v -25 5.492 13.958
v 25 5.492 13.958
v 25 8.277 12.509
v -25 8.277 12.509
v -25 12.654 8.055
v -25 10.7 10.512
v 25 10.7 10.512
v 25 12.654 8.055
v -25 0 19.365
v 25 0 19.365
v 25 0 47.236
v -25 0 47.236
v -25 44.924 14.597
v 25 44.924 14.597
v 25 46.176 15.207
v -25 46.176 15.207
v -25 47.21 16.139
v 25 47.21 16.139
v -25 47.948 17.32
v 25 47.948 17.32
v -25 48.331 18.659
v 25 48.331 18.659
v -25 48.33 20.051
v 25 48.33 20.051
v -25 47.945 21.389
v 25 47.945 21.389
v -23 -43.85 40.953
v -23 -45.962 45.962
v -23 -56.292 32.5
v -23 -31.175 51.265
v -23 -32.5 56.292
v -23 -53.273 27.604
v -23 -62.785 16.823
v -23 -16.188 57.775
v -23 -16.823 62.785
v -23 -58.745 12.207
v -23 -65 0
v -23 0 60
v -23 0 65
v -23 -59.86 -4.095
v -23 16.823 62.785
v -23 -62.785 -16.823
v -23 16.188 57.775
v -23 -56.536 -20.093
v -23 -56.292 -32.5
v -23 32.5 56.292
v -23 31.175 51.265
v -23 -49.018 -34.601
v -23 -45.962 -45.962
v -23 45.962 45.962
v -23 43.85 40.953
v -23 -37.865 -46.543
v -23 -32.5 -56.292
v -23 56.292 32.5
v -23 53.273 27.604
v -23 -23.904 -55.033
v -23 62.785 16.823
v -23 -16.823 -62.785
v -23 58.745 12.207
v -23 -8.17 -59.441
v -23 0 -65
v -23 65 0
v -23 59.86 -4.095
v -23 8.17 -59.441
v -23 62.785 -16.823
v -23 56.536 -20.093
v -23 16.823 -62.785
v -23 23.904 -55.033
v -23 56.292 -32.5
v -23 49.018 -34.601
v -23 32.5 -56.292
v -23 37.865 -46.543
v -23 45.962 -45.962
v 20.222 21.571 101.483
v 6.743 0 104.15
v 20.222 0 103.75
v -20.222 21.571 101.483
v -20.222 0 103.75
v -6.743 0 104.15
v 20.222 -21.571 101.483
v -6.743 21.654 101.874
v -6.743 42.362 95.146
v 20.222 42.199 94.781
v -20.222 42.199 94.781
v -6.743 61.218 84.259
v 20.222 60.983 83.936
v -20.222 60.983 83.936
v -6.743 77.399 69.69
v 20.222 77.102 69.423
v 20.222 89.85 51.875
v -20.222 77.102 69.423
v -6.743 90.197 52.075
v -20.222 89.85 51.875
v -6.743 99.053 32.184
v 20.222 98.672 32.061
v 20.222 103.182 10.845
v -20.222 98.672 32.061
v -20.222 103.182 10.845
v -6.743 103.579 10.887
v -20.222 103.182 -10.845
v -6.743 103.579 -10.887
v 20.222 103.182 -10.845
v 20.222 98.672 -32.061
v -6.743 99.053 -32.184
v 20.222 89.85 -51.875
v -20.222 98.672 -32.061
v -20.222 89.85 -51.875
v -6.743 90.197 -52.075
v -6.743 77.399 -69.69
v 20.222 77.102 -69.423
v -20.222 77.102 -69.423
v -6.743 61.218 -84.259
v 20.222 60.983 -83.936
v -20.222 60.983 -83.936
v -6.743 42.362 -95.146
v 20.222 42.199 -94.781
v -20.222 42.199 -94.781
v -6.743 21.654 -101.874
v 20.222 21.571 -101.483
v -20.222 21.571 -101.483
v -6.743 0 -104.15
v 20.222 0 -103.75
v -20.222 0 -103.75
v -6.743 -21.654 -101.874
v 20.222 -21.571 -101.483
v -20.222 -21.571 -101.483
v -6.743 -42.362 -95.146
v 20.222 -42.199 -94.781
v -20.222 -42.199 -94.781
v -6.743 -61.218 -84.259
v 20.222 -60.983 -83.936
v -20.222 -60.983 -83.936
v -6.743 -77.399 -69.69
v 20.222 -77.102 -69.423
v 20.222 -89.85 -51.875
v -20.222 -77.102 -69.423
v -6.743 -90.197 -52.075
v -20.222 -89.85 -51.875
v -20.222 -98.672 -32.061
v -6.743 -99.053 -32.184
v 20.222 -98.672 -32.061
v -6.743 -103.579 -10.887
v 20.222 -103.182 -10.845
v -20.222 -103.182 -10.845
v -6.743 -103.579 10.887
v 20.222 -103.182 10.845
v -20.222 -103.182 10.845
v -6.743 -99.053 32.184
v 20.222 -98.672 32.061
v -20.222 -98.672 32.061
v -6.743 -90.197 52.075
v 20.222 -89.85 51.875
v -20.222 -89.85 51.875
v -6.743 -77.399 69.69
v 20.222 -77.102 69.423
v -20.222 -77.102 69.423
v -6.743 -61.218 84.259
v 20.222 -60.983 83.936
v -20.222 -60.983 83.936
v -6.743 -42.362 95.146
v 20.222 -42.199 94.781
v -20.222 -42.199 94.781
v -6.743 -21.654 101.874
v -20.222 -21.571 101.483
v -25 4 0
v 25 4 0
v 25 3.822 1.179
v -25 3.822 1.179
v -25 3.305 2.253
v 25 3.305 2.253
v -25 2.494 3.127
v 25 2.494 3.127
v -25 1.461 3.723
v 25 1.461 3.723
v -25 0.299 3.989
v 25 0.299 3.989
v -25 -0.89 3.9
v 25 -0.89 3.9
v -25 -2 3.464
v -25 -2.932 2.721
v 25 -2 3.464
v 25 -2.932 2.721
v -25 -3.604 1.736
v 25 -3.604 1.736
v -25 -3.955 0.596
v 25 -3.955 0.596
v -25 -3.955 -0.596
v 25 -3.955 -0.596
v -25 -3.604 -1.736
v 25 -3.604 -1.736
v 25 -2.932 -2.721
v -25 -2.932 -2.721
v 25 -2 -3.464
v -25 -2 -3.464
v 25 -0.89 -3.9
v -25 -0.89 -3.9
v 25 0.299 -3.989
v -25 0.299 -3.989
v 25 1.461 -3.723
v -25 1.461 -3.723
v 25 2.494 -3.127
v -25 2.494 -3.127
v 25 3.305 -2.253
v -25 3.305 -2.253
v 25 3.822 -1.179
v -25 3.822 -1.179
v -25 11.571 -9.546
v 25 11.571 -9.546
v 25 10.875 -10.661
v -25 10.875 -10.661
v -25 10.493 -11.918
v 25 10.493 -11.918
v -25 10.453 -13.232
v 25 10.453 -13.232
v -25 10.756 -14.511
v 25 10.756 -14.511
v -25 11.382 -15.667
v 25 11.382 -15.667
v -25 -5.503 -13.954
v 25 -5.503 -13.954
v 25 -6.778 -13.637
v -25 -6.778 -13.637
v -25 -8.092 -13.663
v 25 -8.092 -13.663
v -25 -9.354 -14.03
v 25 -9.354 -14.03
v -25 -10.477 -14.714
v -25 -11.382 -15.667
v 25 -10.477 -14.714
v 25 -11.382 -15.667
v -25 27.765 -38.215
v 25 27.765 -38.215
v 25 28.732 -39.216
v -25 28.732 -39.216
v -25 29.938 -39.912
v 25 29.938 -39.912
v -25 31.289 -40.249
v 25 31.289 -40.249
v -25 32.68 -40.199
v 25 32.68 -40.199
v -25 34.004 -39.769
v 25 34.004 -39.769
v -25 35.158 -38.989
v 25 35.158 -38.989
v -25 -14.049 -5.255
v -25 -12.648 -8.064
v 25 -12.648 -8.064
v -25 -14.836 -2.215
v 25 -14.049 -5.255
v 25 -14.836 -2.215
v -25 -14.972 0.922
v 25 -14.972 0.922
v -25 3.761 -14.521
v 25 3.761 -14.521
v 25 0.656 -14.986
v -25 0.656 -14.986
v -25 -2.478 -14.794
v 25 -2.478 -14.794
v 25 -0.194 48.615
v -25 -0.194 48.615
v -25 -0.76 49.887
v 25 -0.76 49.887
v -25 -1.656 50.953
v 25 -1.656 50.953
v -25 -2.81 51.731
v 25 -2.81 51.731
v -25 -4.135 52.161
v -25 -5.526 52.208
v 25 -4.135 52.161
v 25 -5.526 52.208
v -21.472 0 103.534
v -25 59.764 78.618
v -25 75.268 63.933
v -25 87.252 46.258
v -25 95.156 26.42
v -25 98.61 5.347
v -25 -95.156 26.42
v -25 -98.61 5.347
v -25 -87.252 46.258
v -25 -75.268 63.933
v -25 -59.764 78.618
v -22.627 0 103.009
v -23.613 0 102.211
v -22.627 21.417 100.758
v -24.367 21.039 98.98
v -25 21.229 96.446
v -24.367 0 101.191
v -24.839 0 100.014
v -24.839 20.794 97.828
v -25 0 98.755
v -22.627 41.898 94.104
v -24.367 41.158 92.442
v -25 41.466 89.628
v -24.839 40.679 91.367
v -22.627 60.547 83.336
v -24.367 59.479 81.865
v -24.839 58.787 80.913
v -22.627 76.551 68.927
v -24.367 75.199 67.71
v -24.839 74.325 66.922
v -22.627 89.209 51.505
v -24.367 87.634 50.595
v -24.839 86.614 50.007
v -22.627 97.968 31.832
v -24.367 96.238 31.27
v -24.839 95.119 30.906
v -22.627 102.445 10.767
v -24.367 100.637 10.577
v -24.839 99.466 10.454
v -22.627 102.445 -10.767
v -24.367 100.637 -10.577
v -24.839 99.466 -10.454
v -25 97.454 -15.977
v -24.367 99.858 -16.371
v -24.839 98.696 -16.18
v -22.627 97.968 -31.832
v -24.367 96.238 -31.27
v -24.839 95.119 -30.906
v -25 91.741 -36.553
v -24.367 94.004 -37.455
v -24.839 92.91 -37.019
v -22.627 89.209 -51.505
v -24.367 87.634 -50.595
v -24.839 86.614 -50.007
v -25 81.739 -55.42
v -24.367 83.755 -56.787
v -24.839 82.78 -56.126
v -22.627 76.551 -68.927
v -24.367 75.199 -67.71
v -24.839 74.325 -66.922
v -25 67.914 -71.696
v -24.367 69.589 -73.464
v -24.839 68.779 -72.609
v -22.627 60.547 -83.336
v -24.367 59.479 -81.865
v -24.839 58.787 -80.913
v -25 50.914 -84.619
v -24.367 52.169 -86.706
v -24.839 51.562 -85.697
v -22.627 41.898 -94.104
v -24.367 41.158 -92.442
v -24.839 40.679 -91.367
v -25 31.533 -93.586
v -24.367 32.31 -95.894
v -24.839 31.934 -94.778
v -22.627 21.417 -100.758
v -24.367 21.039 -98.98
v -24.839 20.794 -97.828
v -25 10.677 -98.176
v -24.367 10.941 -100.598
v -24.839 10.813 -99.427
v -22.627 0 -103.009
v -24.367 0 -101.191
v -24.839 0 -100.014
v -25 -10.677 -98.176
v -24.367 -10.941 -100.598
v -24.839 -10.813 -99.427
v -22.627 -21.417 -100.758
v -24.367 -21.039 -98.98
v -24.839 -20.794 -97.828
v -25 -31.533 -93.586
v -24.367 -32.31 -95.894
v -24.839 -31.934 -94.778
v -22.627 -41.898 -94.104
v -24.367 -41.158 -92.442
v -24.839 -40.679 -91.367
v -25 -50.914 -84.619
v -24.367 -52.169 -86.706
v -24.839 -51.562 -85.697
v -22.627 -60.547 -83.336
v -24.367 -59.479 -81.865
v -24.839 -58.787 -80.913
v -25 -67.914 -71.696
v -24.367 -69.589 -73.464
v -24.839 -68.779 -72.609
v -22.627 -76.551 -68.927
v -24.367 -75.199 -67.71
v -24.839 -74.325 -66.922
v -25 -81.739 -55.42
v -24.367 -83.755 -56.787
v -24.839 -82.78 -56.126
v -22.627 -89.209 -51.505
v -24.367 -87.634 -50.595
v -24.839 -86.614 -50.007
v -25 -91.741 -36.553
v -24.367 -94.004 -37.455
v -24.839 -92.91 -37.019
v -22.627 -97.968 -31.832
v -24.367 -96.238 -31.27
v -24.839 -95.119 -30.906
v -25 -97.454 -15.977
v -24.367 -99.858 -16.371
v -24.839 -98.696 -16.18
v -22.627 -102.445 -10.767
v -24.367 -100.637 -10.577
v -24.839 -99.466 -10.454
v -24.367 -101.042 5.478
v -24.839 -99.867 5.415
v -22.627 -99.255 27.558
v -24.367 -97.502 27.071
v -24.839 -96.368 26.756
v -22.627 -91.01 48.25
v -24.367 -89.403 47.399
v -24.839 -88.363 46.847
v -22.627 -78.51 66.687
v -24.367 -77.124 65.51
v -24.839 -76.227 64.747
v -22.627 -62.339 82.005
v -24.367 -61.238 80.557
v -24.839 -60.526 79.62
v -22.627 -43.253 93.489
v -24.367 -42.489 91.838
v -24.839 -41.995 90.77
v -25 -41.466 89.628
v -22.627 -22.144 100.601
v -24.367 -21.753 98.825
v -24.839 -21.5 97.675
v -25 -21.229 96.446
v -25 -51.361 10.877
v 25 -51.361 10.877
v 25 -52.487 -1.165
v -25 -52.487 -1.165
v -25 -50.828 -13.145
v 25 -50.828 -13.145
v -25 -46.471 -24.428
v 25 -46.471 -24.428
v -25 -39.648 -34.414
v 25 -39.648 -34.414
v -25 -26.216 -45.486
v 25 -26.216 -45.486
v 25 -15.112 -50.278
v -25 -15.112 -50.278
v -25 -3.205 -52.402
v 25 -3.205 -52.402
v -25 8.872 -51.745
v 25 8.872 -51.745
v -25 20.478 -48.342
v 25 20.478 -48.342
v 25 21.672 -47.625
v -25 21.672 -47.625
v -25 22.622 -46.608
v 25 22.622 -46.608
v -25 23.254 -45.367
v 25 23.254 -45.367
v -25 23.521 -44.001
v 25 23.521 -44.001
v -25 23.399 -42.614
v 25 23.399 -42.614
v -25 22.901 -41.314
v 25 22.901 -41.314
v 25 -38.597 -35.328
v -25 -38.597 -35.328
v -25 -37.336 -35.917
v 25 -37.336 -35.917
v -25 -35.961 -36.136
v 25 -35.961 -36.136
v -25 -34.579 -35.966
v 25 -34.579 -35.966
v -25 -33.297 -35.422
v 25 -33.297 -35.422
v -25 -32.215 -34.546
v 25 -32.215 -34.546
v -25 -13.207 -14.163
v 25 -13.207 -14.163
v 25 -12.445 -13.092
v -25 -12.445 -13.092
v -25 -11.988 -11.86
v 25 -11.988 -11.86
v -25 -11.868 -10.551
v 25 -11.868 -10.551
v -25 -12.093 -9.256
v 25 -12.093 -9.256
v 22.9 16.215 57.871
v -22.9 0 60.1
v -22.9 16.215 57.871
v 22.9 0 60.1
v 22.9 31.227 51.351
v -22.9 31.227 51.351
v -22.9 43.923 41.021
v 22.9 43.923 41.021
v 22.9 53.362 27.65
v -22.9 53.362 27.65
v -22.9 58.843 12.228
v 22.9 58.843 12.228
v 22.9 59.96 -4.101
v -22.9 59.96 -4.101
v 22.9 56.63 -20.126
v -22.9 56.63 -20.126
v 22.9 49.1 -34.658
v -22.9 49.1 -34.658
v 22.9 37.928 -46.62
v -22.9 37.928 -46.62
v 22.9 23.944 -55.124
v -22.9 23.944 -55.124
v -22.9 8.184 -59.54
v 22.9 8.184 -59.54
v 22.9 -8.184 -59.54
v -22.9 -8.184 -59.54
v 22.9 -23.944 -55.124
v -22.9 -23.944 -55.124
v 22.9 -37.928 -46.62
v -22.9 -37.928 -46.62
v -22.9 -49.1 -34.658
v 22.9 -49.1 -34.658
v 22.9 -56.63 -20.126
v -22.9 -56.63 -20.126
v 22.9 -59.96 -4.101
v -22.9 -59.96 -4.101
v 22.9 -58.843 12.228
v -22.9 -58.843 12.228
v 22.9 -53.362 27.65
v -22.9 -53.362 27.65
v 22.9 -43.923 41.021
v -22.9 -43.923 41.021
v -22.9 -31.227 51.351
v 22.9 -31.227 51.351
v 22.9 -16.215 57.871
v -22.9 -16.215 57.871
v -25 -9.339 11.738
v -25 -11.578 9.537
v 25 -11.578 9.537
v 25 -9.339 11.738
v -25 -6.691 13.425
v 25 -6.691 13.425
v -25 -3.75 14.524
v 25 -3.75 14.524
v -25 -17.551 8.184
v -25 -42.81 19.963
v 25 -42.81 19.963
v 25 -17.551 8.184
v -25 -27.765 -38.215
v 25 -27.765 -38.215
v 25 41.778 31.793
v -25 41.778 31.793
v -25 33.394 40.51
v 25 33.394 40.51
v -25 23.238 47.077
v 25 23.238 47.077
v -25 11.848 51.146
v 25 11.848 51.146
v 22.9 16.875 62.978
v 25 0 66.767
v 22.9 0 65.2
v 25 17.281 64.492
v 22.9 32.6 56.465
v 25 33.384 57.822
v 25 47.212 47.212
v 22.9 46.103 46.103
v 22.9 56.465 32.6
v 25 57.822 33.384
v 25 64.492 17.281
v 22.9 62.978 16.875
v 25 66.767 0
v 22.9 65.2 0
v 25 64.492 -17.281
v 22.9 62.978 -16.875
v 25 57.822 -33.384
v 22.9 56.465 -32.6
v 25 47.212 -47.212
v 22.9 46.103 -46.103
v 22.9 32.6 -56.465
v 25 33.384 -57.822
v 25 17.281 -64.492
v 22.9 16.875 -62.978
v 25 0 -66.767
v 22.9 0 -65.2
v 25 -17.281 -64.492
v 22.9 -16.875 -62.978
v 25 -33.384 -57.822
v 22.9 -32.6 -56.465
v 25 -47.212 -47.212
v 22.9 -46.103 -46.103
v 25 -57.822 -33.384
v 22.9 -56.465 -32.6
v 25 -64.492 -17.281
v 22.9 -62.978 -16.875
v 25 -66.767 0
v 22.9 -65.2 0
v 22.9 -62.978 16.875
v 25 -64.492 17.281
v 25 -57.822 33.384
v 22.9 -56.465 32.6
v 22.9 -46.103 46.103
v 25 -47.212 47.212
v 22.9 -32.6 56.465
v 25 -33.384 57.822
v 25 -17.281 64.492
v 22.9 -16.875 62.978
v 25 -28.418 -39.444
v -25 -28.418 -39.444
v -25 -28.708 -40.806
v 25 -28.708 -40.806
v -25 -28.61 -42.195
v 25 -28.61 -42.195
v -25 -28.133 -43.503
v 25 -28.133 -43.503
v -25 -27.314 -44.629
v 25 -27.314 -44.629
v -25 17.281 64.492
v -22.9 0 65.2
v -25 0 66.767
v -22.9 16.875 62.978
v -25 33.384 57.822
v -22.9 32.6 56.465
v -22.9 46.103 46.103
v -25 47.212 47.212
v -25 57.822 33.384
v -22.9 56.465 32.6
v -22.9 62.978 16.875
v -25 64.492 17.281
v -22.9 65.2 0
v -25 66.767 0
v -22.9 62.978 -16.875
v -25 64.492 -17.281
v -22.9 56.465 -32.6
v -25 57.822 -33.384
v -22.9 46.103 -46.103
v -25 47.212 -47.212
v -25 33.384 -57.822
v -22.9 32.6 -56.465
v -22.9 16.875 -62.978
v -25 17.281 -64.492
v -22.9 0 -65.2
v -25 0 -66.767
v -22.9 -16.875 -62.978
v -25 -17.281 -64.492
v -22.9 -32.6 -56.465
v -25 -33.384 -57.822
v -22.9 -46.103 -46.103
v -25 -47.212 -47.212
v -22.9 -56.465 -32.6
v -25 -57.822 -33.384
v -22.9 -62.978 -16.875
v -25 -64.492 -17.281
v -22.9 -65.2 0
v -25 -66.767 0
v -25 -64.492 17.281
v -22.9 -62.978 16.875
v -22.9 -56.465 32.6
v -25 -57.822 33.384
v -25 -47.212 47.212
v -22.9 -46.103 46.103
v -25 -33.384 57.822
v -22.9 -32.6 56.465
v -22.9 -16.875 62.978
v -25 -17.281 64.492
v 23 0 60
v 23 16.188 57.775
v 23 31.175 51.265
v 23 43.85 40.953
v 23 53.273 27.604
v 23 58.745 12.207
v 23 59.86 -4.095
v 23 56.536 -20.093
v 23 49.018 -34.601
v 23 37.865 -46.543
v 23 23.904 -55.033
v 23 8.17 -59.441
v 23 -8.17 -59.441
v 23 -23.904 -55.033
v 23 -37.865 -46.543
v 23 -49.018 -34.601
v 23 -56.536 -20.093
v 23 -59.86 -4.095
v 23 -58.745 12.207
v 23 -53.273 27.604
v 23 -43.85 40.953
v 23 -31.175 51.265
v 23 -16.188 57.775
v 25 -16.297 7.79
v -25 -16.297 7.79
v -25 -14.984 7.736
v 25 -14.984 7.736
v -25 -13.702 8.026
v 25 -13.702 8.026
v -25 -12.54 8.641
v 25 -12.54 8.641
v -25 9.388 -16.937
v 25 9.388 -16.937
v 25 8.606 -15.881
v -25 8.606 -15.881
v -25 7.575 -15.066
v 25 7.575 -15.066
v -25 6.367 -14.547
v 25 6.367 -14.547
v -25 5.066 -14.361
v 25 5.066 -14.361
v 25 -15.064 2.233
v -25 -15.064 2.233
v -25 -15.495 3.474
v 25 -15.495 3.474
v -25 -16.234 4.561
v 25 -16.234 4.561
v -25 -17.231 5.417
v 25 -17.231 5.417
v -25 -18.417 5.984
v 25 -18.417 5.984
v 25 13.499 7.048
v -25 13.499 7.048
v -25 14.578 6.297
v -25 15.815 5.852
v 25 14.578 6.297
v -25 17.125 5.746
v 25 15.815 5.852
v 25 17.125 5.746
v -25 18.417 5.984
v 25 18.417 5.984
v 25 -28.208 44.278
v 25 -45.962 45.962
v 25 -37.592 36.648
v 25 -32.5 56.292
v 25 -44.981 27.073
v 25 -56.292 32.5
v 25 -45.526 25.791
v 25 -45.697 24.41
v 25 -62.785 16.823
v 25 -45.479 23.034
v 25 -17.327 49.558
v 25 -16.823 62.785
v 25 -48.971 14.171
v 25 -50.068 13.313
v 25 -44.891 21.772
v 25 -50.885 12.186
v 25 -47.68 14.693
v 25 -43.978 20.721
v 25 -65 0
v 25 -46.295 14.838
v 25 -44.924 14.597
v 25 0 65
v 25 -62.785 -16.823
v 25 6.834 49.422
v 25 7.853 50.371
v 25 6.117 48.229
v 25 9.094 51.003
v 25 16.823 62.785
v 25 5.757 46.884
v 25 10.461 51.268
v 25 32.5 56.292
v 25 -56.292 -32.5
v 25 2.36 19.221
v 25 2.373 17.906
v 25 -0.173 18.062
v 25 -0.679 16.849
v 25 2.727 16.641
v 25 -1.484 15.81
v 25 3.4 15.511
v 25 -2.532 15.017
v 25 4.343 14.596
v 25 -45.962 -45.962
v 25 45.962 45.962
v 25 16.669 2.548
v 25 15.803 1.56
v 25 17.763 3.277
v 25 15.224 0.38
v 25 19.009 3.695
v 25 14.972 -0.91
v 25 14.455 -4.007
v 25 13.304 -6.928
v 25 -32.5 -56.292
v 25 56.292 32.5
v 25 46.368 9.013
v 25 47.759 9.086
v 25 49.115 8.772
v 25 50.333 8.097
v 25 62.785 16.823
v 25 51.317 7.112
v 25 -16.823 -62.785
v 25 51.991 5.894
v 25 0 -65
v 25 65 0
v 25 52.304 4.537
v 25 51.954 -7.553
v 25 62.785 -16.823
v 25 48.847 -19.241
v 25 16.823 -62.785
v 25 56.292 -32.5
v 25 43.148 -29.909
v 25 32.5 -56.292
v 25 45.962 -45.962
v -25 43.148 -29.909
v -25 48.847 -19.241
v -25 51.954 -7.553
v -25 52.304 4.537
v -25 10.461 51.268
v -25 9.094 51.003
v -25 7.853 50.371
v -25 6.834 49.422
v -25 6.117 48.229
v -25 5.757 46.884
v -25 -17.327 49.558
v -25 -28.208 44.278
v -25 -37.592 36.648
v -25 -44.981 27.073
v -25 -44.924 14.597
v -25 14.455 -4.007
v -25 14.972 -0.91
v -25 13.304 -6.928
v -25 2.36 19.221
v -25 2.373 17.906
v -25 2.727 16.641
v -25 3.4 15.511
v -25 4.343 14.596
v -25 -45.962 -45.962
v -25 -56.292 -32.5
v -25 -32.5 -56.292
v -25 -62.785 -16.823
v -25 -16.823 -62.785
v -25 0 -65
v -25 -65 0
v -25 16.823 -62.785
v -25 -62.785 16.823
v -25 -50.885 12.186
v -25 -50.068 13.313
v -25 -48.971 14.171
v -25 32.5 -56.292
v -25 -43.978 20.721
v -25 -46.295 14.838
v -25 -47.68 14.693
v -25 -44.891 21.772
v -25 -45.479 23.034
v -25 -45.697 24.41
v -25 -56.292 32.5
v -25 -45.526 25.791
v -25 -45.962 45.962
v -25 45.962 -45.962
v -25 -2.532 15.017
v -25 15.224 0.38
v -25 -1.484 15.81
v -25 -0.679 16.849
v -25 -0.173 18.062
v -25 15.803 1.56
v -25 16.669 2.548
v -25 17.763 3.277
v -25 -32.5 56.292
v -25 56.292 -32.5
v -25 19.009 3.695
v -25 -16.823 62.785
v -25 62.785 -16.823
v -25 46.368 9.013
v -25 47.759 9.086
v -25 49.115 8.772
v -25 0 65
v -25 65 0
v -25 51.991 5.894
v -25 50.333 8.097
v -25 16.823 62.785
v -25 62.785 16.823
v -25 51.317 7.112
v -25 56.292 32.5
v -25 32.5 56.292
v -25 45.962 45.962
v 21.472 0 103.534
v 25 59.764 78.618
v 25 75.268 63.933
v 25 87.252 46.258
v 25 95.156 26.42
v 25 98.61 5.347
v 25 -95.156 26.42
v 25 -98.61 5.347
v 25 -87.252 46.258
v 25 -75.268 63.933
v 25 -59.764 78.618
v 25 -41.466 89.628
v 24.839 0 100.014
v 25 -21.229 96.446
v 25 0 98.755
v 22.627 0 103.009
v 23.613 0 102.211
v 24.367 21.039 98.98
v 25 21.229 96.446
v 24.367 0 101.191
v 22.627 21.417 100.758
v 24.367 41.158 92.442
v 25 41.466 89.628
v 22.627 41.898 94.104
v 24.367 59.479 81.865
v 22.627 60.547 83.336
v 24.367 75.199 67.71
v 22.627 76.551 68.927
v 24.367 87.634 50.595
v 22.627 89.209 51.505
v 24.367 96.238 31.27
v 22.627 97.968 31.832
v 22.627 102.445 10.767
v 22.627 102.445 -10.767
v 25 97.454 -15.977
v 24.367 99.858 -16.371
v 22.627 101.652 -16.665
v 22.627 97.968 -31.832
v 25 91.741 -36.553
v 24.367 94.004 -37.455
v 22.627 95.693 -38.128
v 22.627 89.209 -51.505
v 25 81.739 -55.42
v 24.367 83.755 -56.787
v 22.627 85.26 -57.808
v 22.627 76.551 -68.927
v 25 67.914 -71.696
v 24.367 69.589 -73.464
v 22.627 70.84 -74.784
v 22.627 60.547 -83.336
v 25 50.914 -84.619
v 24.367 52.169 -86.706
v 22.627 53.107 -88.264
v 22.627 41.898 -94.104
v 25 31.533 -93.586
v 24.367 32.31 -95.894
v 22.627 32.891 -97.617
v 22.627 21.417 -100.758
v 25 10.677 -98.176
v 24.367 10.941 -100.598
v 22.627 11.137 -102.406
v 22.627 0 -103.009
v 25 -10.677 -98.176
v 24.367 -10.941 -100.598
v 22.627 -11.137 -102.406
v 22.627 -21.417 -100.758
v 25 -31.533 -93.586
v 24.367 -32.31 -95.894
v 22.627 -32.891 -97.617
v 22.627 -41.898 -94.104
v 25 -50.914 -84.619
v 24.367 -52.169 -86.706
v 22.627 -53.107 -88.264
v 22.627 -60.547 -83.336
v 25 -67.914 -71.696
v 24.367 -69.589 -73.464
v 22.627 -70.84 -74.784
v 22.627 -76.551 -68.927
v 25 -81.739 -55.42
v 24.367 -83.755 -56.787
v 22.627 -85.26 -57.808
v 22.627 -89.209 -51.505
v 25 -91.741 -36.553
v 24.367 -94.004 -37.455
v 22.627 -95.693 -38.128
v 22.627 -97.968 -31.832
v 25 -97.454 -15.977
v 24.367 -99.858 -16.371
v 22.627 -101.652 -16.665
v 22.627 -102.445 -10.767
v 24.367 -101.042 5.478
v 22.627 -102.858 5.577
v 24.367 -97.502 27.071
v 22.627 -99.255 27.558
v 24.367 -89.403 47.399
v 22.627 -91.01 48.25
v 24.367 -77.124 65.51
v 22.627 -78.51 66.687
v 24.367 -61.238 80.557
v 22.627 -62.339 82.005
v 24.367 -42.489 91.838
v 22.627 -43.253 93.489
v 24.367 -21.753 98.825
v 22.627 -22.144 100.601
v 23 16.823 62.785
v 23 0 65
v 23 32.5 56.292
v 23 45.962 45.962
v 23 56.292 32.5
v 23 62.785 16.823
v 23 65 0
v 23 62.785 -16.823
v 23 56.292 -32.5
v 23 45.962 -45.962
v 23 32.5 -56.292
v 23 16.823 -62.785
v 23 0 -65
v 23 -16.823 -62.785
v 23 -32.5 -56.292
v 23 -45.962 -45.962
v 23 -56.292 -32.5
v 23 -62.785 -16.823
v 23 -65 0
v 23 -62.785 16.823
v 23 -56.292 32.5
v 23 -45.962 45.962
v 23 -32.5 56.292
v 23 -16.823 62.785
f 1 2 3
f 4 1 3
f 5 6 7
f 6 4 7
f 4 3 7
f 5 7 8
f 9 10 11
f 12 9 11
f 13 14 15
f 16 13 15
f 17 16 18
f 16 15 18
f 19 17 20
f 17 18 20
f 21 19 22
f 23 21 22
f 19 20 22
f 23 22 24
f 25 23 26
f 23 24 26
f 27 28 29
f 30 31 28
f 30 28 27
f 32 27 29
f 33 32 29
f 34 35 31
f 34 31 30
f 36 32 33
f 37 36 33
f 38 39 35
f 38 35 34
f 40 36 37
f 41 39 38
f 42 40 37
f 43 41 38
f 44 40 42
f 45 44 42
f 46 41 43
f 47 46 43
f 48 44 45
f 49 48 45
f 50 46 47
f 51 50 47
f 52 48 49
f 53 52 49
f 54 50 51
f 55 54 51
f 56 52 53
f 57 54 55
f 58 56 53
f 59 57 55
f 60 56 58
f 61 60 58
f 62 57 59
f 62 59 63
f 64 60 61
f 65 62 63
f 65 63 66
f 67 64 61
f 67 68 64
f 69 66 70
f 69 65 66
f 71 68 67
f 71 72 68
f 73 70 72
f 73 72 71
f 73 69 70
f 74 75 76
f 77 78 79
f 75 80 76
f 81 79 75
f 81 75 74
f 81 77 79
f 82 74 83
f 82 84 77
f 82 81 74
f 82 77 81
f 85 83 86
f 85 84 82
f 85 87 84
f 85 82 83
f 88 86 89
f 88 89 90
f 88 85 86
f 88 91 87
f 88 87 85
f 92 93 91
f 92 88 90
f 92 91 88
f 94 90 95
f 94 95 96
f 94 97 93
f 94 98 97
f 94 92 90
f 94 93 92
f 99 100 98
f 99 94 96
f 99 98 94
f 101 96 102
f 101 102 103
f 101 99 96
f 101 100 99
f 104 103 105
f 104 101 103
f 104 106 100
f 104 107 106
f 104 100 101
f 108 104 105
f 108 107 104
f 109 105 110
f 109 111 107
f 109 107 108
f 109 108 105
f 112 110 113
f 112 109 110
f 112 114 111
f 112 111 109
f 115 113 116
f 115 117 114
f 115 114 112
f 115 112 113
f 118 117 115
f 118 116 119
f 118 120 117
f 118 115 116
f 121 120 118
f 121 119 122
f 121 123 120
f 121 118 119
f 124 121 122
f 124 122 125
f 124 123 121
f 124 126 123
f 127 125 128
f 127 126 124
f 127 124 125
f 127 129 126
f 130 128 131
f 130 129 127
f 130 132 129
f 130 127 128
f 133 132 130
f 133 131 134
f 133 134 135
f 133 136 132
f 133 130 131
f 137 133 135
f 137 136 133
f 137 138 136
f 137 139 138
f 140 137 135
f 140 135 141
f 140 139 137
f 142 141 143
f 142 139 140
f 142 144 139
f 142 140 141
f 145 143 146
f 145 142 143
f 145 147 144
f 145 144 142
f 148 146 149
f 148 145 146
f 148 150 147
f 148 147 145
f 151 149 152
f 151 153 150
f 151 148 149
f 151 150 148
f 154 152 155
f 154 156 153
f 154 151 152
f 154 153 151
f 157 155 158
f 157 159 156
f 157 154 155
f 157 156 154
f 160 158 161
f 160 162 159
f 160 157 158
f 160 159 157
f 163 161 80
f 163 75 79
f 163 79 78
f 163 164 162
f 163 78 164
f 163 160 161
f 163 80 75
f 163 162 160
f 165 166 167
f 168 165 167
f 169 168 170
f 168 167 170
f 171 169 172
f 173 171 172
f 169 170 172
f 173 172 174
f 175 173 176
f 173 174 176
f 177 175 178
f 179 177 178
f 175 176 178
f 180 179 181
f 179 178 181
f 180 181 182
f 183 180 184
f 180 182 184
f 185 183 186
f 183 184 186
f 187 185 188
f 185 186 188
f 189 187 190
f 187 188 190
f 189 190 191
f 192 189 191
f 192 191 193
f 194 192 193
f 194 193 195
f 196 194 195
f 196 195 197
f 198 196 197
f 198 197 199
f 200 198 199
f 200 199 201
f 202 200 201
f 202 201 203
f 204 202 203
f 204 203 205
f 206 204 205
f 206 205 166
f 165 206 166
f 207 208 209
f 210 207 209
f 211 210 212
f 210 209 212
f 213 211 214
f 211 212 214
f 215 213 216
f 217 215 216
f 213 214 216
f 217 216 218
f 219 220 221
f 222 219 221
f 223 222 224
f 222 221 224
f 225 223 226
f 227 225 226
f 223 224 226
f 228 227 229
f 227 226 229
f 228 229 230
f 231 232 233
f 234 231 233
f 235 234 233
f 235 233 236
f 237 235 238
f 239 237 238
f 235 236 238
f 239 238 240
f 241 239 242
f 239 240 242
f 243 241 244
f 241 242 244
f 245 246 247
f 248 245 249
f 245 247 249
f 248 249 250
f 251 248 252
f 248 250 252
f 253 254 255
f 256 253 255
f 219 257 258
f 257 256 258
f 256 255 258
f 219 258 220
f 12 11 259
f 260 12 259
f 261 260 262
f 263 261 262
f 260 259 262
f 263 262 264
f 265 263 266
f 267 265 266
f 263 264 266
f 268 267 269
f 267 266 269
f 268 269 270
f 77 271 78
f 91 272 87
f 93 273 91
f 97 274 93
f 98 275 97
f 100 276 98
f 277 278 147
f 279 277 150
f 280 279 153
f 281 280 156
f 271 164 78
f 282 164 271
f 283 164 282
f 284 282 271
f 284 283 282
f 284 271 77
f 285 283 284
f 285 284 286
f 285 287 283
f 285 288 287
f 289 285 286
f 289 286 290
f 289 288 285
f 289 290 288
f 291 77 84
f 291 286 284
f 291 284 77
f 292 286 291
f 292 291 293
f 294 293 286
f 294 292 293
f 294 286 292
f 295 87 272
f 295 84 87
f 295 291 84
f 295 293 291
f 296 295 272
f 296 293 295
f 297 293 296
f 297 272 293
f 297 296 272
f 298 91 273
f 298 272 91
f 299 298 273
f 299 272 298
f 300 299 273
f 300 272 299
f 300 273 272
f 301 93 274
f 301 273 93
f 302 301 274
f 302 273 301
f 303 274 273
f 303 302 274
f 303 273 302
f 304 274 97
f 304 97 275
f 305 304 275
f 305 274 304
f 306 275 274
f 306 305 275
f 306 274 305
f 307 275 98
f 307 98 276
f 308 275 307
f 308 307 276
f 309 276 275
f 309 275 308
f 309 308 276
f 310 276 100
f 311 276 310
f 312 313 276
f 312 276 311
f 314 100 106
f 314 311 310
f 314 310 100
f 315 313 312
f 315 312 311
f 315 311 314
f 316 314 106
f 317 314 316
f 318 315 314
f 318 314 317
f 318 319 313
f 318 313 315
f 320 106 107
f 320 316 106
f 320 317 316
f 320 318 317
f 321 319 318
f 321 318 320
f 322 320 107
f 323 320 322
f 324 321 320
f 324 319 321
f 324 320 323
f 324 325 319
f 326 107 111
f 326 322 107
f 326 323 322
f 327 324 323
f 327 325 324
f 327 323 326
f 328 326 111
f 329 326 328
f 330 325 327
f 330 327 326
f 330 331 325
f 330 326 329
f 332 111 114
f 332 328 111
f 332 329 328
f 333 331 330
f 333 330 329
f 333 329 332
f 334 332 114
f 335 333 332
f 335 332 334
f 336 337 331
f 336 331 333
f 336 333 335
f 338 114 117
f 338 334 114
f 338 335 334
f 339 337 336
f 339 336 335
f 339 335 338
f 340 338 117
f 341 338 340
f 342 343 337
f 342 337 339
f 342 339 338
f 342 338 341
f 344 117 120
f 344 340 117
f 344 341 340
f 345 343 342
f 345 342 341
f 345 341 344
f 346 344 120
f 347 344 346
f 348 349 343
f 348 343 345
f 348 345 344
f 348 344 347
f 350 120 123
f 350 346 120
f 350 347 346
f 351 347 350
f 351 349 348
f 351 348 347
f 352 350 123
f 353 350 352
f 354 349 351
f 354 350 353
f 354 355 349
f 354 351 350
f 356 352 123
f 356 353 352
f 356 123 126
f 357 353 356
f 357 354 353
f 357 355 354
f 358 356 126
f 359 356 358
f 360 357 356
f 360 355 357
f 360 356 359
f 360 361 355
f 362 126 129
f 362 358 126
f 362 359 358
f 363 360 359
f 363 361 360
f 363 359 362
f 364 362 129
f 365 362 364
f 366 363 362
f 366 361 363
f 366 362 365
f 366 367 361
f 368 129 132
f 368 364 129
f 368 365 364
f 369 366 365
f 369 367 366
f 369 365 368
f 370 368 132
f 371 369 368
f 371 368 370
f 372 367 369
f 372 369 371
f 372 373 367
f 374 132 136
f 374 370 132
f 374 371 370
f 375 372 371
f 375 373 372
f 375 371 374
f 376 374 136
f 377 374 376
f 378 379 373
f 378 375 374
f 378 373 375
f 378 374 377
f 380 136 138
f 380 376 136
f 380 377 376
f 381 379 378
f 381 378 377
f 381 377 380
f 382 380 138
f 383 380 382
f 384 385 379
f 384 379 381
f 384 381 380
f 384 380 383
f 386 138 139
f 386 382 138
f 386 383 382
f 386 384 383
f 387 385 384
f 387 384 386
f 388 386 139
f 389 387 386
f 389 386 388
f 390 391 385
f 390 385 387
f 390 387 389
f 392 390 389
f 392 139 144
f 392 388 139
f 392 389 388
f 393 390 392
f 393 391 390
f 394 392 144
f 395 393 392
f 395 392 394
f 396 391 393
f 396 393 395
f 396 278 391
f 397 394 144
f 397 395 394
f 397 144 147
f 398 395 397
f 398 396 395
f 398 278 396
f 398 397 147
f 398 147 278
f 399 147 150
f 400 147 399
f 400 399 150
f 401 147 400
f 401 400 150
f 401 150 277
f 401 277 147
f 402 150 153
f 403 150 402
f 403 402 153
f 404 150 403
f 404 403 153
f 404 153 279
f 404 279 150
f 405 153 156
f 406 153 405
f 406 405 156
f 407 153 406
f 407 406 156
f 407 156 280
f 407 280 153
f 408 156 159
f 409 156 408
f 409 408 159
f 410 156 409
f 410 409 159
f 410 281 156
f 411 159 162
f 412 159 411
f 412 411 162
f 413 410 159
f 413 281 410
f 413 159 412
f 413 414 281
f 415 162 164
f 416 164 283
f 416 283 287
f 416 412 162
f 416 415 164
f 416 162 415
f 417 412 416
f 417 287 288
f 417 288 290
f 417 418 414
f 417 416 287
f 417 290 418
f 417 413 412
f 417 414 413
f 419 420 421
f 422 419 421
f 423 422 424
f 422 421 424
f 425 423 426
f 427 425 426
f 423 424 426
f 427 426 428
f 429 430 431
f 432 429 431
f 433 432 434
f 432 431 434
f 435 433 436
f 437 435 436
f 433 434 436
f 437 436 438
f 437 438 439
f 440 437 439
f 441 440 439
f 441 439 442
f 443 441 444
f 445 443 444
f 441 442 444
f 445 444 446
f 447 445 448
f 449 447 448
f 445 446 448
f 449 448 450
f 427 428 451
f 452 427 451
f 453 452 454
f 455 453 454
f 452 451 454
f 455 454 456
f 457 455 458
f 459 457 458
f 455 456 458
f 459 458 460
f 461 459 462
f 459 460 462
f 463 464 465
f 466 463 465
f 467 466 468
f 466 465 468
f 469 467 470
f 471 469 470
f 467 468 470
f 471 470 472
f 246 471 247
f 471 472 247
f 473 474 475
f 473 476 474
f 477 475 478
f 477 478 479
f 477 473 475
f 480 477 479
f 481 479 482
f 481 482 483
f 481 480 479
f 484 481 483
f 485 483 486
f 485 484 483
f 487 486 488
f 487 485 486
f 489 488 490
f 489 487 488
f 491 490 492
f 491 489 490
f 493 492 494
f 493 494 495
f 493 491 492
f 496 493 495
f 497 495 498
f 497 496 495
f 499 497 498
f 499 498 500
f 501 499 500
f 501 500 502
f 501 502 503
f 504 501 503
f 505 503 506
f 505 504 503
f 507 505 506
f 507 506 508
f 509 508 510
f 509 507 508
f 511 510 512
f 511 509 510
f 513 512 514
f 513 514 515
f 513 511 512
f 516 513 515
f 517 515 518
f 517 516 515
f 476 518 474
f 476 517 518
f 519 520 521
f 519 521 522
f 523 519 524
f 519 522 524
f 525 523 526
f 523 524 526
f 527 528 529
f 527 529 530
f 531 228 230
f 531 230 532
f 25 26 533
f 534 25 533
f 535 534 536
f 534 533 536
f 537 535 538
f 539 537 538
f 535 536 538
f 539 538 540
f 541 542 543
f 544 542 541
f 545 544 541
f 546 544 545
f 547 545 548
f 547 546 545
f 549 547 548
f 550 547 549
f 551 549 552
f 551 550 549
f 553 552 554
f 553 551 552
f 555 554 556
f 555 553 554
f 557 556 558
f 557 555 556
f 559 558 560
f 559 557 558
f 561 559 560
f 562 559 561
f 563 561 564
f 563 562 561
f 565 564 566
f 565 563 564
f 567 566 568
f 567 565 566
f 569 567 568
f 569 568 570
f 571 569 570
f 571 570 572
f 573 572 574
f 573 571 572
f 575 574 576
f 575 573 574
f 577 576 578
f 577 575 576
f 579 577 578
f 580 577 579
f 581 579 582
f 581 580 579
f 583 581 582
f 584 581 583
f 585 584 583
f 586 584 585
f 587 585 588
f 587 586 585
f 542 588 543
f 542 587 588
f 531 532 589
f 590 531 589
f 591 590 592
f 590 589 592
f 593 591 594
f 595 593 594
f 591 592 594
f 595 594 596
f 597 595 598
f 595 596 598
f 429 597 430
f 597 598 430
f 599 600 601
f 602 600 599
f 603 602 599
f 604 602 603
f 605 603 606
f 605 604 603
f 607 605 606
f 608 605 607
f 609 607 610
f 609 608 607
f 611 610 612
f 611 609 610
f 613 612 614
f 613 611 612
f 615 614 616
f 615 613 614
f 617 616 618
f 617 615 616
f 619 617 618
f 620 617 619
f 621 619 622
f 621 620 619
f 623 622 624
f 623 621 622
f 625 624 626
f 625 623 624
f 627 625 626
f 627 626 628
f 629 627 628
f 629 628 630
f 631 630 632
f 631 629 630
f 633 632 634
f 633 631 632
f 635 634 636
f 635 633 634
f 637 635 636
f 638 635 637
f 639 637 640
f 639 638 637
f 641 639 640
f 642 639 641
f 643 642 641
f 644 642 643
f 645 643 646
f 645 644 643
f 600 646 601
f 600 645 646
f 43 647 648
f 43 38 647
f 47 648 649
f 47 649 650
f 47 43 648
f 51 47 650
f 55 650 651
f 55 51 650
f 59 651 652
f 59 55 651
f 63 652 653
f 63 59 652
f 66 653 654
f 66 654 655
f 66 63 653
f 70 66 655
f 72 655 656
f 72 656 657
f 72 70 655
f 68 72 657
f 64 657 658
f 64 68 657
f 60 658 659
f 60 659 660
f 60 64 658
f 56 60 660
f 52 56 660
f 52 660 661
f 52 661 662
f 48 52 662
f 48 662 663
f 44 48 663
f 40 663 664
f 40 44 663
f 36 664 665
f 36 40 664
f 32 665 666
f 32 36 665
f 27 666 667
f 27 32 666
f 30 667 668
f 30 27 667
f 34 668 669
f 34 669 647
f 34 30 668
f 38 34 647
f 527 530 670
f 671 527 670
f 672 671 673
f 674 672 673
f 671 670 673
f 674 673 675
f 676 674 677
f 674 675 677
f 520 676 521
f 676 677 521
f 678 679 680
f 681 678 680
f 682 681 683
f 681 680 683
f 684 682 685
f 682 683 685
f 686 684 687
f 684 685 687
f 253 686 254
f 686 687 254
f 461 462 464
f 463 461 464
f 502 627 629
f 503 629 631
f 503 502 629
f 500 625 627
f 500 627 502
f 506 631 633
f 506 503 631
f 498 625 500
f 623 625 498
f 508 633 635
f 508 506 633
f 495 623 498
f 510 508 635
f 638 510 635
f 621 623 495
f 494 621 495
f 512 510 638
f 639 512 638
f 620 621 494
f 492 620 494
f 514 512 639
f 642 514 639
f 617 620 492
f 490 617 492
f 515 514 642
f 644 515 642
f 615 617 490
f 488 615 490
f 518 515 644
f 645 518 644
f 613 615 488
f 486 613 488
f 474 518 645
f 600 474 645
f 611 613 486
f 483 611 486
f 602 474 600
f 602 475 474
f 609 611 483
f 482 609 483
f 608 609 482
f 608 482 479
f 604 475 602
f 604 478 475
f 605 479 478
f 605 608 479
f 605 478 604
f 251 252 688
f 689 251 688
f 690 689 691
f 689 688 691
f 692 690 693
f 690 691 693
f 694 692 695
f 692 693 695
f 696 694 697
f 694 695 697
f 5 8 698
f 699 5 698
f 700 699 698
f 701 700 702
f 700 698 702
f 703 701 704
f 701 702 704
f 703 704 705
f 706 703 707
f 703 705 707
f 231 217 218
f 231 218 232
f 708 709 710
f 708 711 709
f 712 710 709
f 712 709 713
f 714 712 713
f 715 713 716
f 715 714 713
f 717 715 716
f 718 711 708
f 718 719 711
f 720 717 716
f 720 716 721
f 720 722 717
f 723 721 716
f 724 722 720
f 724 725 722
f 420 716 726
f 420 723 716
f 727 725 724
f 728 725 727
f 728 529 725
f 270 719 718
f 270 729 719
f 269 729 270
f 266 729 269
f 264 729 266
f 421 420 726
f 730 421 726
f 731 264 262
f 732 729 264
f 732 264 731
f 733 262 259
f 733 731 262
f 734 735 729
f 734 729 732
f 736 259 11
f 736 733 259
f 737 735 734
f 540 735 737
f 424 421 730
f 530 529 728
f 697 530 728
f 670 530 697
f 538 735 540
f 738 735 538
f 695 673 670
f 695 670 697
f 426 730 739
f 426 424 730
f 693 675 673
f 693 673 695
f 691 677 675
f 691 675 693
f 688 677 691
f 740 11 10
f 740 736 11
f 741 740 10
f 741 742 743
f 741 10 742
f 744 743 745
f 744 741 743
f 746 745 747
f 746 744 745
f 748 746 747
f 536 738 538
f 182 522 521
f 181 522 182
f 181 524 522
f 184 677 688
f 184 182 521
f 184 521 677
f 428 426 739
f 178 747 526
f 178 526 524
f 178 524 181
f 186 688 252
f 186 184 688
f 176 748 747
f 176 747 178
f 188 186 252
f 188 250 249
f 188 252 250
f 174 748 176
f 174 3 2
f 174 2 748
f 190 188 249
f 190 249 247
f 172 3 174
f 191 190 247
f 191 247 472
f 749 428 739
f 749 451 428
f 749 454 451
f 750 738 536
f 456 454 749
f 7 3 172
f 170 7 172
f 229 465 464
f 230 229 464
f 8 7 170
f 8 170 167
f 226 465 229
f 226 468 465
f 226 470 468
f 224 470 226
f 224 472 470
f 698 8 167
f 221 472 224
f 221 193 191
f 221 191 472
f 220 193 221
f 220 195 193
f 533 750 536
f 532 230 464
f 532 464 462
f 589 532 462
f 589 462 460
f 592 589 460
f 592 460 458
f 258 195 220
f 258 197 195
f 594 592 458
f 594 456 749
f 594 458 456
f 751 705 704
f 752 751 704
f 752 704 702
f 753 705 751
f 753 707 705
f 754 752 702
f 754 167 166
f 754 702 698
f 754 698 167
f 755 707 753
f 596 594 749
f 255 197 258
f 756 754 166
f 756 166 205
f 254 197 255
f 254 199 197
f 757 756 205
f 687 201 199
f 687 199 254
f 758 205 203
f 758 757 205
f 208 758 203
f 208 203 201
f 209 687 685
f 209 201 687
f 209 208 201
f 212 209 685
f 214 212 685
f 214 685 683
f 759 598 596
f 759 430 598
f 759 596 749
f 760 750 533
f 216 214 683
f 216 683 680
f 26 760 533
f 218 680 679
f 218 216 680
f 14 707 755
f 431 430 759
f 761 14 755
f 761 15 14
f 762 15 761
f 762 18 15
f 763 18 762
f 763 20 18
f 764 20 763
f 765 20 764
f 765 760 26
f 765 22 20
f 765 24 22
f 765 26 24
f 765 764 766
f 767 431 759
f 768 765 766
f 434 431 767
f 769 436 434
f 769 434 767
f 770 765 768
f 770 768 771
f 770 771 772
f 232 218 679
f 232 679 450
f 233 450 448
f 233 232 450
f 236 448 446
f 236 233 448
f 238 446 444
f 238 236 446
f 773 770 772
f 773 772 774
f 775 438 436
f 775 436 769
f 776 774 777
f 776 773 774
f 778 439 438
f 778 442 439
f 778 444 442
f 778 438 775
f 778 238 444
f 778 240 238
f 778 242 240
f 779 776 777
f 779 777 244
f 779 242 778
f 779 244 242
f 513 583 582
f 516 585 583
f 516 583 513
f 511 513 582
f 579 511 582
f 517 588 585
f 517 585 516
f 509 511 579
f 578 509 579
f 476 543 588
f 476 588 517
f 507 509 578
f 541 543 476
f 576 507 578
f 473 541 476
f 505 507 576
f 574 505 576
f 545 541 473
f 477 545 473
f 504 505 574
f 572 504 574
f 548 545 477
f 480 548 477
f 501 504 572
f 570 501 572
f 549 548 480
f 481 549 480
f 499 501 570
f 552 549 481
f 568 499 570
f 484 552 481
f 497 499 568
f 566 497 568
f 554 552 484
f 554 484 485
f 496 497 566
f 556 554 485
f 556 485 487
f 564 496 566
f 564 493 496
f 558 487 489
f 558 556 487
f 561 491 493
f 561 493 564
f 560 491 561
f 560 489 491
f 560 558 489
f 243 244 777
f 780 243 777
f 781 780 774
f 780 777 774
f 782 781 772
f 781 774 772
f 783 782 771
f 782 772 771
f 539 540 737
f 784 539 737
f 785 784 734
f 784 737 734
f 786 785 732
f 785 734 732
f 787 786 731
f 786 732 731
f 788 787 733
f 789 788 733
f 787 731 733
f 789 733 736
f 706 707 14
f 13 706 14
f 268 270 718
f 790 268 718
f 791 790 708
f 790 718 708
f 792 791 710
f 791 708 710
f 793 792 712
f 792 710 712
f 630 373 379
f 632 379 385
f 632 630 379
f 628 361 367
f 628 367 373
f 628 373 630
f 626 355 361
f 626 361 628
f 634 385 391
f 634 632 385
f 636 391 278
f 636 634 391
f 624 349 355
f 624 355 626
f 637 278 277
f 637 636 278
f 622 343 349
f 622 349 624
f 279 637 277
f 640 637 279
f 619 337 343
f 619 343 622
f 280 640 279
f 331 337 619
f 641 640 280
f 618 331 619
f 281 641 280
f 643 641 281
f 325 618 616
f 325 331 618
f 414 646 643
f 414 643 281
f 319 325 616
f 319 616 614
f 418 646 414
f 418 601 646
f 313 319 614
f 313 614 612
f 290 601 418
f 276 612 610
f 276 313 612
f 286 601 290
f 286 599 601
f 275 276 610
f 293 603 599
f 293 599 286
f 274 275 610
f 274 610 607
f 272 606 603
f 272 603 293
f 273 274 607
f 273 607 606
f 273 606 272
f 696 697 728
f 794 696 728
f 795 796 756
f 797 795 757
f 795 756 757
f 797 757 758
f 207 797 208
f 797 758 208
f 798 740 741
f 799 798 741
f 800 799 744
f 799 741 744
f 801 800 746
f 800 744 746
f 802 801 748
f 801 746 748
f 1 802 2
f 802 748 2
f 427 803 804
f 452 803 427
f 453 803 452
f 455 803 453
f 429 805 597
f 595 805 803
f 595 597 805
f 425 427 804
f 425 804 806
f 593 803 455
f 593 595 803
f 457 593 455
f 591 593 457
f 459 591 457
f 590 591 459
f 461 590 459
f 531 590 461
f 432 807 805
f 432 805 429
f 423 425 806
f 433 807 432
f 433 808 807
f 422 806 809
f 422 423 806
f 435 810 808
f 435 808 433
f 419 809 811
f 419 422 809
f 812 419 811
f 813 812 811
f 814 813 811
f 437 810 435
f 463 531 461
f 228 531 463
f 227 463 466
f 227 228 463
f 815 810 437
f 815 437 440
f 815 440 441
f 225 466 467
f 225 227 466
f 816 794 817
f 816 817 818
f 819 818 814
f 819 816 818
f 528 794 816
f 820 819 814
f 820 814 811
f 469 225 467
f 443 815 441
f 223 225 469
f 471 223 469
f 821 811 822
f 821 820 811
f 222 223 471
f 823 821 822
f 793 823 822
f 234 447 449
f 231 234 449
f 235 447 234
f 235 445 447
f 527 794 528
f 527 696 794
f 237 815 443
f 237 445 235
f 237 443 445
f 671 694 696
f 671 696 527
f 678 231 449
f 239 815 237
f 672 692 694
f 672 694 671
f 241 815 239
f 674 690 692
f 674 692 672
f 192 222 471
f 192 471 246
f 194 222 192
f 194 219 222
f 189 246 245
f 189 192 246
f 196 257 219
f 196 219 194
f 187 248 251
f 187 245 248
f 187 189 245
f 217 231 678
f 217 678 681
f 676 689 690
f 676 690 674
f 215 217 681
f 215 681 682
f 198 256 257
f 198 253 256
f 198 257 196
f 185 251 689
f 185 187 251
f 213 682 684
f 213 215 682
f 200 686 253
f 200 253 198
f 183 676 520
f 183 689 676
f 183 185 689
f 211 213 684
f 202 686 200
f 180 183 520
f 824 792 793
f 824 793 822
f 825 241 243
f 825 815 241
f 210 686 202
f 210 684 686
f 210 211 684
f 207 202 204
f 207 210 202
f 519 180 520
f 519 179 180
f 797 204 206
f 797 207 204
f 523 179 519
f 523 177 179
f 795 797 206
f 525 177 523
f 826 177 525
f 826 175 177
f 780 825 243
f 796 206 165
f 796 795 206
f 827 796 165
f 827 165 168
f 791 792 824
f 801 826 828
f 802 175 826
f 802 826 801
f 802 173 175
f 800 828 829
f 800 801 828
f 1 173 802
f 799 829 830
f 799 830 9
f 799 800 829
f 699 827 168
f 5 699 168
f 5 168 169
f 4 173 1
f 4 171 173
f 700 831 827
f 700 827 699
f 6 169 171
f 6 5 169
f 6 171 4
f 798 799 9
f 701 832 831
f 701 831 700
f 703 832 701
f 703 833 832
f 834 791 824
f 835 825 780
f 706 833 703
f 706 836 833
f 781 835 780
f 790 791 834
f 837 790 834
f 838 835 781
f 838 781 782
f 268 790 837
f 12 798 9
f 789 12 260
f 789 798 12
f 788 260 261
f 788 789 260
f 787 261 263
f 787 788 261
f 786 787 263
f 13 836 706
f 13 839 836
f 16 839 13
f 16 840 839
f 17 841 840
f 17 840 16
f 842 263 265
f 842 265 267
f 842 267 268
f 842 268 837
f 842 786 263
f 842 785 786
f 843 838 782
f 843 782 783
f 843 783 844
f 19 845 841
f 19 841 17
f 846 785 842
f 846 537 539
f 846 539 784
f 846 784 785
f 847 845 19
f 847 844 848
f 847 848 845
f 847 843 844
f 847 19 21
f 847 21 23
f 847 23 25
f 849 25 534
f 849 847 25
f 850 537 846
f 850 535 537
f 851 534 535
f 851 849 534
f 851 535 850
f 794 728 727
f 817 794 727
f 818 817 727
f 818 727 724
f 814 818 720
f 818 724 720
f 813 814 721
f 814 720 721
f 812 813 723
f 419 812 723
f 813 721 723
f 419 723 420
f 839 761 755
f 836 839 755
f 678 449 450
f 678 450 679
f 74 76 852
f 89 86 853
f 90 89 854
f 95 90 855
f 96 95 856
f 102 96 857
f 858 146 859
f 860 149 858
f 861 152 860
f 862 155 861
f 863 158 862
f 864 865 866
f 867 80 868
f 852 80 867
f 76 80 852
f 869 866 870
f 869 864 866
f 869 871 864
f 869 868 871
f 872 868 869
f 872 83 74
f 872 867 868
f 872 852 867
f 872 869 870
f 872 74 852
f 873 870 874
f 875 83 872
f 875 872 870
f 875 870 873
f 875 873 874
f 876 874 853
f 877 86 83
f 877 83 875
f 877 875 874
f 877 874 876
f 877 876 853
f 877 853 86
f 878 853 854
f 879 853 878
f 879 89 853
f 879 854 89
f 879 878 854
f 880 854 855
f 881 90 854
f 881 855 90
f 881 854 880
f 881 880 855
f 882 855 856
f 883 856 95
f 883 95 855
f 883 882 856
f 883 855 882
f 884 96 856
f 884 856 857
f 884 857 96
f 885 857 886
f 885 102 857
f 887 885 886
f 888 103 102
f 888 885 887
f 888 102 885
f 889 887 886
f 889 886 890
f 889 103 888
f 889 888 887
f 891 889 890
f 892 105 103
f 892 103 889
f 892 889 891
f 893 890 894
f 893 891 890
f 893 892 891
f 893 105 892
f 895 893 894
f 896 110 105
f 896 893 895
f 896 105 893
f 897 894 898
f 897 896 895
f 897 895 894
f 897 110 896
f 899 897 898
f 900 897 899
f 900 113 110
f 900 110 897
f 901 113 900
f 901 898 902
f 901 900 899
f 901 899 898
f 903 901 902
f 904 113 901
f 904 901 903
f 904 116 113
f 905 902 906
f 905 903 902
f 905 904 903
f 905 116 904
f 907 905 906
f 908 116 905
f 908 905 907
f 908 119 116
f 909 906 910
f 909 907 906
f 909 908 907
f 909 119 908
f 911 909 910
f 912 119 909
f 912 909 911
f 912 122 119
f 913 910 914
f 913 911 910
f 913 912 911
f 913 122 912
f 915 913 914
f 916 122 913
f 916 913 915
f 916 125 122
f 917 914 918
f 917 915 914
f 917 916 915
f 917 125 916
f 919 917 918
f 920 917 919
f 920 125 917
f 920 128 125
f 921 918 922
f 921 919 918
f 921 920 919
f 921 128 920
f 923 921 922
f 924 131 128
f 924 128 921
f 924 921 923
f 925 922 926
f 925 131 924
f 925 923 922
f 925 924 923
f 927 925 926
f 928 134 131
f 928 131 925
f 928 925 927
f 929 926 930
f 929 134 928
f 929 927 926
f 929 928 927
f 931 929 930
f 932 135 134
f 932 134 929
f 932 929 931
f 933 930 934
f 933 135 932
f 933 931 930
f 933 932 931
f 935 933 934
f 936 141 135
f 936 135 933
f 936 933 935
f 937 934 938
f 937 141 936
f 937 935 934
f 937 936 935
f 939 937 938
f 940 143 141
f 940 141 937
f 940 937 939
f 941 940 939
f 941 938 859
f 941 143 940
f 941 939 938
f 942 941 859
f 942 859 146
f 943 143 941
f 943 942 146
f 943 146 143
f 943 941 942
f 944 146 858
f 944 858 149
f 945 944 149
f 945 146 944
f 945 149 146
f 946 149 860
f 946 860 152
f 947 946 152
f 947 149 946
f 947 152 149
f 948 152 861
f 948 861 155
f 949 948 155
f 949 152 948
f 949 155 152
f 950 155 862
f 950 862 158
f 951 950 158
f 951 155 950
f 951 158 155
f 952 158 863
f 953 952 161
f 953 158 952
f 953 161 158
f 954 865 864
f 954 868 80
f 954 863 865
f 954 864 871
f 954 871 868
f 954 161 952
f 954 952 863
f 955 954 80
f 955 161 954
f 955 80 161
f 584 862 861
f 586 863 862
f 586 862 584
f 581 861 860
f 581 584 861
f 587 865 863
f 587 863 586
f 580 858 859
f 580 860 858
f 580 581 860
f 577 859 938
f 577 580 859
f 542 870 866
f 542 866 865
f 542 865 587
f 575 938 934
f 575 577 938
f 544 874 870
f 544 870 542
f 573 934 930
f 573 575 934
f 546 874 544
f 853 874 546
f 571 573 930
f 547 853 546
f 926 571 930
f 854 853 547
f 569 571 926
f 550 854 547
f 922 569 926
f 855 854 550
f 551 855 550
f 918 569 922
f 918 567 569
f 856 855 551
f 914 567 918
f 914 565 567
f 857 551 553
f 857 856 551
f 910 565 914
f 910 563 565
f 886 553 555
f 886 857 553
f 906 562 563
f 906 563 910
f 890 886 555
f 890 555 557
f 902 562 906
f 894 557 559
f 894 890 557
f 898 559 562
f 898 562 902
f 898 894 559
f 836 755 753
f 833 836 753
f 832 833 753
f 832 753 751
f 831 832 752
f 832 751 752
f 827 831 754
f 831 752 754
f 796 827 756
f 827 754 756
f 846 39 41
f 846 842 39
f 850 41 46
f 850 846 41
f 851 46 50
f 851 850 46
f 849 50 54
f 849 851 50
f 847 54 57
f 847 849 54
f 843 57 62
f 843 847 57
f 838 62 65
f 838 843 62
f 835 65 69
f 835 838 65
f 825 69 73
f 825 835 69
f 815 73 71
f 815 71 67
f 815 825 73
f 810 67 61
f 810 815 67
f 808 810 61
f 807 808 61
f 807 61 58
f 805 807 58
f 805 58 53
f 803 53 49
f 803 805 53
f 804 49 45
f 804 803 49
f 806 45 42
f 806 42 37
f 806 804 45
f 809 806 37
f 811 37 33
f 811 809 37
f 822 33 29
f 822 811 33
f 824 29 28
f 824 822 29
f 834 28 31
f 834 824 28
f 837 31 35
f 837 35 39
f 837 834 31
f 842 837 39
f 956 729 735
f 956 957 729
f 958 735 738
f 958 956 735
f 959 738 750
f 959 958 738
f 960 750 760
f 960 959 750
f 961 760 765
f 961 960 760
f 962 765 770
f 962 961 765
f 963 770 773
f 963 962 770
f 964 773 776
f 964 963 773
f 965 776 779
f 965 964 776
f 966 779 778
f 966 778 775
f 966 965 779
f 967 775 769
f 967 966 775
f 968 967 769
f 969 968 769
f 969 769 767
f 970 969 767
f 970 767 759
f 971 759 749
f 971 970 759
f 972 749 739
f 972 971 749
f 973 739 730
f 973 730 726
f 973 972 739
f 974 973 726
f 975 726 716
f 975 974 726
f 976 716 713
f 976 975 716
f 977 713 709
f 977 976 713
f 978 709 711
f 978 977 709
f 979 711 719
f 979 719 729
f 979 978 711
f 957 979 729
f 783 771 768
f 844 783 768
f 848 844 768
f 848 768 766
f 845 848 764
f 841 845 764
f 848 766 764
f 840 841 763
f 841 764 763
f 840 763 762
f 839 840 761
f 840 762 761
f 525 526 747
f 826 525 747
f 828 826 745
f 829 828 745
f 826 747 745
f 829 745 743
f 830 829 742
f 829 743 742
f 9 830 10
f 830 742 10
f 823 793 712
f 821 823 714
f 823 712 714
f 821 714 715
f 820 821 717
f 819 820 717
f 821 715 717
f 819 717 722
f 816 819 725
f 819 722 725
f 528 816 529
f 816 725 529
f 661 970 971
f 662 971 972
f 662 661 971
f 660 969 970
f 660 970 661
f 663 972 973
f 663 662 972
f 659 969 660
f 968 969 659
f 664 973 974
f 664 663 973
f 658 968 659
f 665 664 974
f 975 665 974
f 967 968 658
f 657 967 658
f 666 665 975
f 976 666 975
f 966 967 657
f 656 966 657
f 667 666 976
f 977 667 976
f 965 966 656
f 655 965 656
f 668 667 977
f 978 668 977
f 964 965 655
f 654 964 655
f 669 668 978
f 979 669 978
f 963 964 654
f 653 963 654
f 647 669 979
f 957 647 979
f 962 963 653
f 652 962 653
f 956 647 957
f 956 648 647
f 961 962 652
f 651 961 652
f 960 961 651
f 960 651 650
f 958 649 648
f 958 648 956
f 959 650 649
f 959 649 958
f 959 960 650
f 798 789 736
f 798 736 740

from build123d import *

# Parameters (mm, degrees)
F3_DEPTH = 50.001
F4_R     = 4
F5_DEPTH = 50.001


with BuildPart() as f1:
    # F0 (on Front) → F1 (revolve)
    with BuildSketch(Plane.XZ):
        Polygon((-25, 0), (0, 0), (25, 0), (25, 65), (23, 65), (23, 60), (0, 60), (-23, 60), (-23, 65), (-25, 65), align=None)
    revolve(axis=Axis((11.969276, 0, 0), (-1, 0, 0)))

    # F2 (on face) → F3 (cut, through all)
    with BuildSketch(Plane.YZ.offset(25)):
        with BuildLine():
            ThreePointArc((-12.647707, -8.06446), (-14.522214, -3.755701), (-14.971661, 0.921604))
            ThreePointArc((-14.971661, 0.921604), (-15.828714, 4.042019), (-18.41713, 5.984088))
            Line((-18.41713, 5.984088), (-44.924209, 14.59676))
            ThreePointArc((-44.924209, 14.59676), (-48.970894, 14.170681), (-51.360799, 10.877423))
            ThreePointArc((-51.360799, 10.877423), (-50.827751, -13.144951), (-39.647686, -34.41382))
            ThreePointArc((-39.647686, -34.41382), (-35.960825, -36.135519), (-32.214948, -34.546305))
            Line((-32.214948, -34.546305), (-13.20684, -14.162605))
            ThreePointArc((-13.20684, -14.162605), (-11.884495, -11.209144), (-12.647707, -8.06446))
        make_face()
        with BuildLine():
            ThreePointArc((0, 47.236109), (-1.65572, 50.953069), (-5.526316, 52.208331))
            ThreePointArc((-5.526316, 52.208331), (-28.20823, 44.27805), (-44.981296, 27.072735))
            ThreePointArc((-44.981296, 27.072735), (-45.479427, 23.034287), (-42.810454, 19.962841))
            Line((-42.810454, 19.962841), (-17.550576, 8.183966))
            ThreePointArc((-17.550576, 8.183966), (-14.33304, 7.83901), (-11.578114, 9.536629))
            ThreePointArc((-11.578114, 9.536629), (-8.059495, 12.650871), (-3.75, 14.523688))
            ThreePointArc((-3.75, 14.523688), (-1.047153, 16.303055), (0, 19.364917))
            Line((0, 19.364917), (0, 47.236109))
        make_face()
        with BuildLine():
            Line((5.756632, 46.884019), (2.359988, 19.220574))
            ThreePointArc((2.359988, 19.220574), (3.026188, 16.053919), (5.492039, 13.958421))
            ThreePointArc((5.492039, 13.958421), (9.541173, 11.574369), (12.654034, 8.054528))
            ThreePointArc((12.654034, 8.054528), (15.181538, 6.033823), (18.41713, 5.984088))
            Line((18.41713, 5.984088), (44.924209, 14.59676))
            ThreePointArc((44.924209, 14.59676), (47.947603, 17.320047), (47.945348, 21.3891))
            ThreePointArc((47.945348, 21.3891), (33.394106, 40.510291), (11.847716, 51.14569))
            ThreePointArc((11.847716, 51.14569), (7.852993, 50.371491), (5.756632, 46.884019))
        make_face()
        with BuildLine():
            ThreePointArc((-5.502996, -13.954105), (-8.735531, -13.804949), (-11.382412, -15.666547))
            Line((-11.382412, -15.666547), (-27.764688, -38.214815))
            ThreePointArc((-27.764688, -38.214815), (-28.609957, -42.195106), (-26.216404, -45.485714))
            ThreePointArc((-26.216404, -45.485714), (-3.205047, -52.402077), (20.477678, -48.341645))
            ThreePointArc((20.477678, -48.341645), (23.254415, -45.367266), (22.900522, -41.313631))
            Line((22.900522, -41.313631), (9.3883, -16.936937))
            ThreePointArc((9.3883, -16.936937), (6.988019, -14.766642), (3.761401, -14.520739))
            ThreePointArc((3.761401, -14.520739), (-0.915727, -14.972022), (-5.502996, -13.954105))
        make_face()
        with BuildLine():
            ThreePointArc((11.570623, -9.545715), (10.42986, -12.573947), (11.382412, -15.666547))
            Line((11.382412, -15.666547), (27.764688, -38.214815))
            ThreePointArc((27.764688, -38.214815), (31.288968, -40.248691), (35.15817, -38.98914))
            ThreePointArc((35.15817, -38.98914), (48.846923, -19.241313), (52.303588, 4.53704))
            ThreePointArc((52.303588, 4.53704), (50.332843, 8.097006), (46.368249, 9.013076))
            Line((46.368249, 9.013076), (19.009129, 3.695002))
            ThreePointArc((19.009129, 3.695002), (16.203328, 2.082857), (14.97238, -0.90985))
            ThreePointArc((14.97238, -0.90985), (13.956264, -5.497518), (11.570623, -9.545715))
        make_face()
    extrude(amount=-F3_DEPTH, mode=Mode.SUBTRACT)

    # F4 (on face) → F5 (cut, through all)
    with BuildSketch(Plane.YZ.offset(25)):
        Circle(F4_R)
    extrude(amount=-F5_DEPTH, mode=Mode.SUBTRACT)


with BuildPart() as f7:
    # F6 (on Front) → F7 (revolve)
    with BuildSketch(Plane.XZ):
        with BuildLine():
            Line((-22.9, 65.2), (-22.9, 60.1))
            Line((-22.9, 60.1), (0, 60.1))
            Line((0, 60.1), (22.9, 60.1))
            Line((22.9, 60.1), (22.9, 65.2))
            Line((22.9, 65.2), (25, 66.767409))
            Line((25, 66.767409), (25, 98.755323))
            ThreePointArc((25, 98.755323), (23.61325, 102.211394), (20.222229, 103.750382))
            ThreePointArc((20.222229, 103.750382), (0, 104.2), (-20.222229, 103.750382))
            ThreePointArc((-20.222229, 103.750382), (-23.61325, 102.211394), (-25, 98.755323))
            Line((-25, 98.755323), (-25, 66.767409))
            Line((-25, 66.767409), (-22.9, 65.2))
        make_face()
    revolve(axis=Axis((11.969276, 0, 0), (-1, 0, 0)))


solid = Compound([f1.part, f7.part])
